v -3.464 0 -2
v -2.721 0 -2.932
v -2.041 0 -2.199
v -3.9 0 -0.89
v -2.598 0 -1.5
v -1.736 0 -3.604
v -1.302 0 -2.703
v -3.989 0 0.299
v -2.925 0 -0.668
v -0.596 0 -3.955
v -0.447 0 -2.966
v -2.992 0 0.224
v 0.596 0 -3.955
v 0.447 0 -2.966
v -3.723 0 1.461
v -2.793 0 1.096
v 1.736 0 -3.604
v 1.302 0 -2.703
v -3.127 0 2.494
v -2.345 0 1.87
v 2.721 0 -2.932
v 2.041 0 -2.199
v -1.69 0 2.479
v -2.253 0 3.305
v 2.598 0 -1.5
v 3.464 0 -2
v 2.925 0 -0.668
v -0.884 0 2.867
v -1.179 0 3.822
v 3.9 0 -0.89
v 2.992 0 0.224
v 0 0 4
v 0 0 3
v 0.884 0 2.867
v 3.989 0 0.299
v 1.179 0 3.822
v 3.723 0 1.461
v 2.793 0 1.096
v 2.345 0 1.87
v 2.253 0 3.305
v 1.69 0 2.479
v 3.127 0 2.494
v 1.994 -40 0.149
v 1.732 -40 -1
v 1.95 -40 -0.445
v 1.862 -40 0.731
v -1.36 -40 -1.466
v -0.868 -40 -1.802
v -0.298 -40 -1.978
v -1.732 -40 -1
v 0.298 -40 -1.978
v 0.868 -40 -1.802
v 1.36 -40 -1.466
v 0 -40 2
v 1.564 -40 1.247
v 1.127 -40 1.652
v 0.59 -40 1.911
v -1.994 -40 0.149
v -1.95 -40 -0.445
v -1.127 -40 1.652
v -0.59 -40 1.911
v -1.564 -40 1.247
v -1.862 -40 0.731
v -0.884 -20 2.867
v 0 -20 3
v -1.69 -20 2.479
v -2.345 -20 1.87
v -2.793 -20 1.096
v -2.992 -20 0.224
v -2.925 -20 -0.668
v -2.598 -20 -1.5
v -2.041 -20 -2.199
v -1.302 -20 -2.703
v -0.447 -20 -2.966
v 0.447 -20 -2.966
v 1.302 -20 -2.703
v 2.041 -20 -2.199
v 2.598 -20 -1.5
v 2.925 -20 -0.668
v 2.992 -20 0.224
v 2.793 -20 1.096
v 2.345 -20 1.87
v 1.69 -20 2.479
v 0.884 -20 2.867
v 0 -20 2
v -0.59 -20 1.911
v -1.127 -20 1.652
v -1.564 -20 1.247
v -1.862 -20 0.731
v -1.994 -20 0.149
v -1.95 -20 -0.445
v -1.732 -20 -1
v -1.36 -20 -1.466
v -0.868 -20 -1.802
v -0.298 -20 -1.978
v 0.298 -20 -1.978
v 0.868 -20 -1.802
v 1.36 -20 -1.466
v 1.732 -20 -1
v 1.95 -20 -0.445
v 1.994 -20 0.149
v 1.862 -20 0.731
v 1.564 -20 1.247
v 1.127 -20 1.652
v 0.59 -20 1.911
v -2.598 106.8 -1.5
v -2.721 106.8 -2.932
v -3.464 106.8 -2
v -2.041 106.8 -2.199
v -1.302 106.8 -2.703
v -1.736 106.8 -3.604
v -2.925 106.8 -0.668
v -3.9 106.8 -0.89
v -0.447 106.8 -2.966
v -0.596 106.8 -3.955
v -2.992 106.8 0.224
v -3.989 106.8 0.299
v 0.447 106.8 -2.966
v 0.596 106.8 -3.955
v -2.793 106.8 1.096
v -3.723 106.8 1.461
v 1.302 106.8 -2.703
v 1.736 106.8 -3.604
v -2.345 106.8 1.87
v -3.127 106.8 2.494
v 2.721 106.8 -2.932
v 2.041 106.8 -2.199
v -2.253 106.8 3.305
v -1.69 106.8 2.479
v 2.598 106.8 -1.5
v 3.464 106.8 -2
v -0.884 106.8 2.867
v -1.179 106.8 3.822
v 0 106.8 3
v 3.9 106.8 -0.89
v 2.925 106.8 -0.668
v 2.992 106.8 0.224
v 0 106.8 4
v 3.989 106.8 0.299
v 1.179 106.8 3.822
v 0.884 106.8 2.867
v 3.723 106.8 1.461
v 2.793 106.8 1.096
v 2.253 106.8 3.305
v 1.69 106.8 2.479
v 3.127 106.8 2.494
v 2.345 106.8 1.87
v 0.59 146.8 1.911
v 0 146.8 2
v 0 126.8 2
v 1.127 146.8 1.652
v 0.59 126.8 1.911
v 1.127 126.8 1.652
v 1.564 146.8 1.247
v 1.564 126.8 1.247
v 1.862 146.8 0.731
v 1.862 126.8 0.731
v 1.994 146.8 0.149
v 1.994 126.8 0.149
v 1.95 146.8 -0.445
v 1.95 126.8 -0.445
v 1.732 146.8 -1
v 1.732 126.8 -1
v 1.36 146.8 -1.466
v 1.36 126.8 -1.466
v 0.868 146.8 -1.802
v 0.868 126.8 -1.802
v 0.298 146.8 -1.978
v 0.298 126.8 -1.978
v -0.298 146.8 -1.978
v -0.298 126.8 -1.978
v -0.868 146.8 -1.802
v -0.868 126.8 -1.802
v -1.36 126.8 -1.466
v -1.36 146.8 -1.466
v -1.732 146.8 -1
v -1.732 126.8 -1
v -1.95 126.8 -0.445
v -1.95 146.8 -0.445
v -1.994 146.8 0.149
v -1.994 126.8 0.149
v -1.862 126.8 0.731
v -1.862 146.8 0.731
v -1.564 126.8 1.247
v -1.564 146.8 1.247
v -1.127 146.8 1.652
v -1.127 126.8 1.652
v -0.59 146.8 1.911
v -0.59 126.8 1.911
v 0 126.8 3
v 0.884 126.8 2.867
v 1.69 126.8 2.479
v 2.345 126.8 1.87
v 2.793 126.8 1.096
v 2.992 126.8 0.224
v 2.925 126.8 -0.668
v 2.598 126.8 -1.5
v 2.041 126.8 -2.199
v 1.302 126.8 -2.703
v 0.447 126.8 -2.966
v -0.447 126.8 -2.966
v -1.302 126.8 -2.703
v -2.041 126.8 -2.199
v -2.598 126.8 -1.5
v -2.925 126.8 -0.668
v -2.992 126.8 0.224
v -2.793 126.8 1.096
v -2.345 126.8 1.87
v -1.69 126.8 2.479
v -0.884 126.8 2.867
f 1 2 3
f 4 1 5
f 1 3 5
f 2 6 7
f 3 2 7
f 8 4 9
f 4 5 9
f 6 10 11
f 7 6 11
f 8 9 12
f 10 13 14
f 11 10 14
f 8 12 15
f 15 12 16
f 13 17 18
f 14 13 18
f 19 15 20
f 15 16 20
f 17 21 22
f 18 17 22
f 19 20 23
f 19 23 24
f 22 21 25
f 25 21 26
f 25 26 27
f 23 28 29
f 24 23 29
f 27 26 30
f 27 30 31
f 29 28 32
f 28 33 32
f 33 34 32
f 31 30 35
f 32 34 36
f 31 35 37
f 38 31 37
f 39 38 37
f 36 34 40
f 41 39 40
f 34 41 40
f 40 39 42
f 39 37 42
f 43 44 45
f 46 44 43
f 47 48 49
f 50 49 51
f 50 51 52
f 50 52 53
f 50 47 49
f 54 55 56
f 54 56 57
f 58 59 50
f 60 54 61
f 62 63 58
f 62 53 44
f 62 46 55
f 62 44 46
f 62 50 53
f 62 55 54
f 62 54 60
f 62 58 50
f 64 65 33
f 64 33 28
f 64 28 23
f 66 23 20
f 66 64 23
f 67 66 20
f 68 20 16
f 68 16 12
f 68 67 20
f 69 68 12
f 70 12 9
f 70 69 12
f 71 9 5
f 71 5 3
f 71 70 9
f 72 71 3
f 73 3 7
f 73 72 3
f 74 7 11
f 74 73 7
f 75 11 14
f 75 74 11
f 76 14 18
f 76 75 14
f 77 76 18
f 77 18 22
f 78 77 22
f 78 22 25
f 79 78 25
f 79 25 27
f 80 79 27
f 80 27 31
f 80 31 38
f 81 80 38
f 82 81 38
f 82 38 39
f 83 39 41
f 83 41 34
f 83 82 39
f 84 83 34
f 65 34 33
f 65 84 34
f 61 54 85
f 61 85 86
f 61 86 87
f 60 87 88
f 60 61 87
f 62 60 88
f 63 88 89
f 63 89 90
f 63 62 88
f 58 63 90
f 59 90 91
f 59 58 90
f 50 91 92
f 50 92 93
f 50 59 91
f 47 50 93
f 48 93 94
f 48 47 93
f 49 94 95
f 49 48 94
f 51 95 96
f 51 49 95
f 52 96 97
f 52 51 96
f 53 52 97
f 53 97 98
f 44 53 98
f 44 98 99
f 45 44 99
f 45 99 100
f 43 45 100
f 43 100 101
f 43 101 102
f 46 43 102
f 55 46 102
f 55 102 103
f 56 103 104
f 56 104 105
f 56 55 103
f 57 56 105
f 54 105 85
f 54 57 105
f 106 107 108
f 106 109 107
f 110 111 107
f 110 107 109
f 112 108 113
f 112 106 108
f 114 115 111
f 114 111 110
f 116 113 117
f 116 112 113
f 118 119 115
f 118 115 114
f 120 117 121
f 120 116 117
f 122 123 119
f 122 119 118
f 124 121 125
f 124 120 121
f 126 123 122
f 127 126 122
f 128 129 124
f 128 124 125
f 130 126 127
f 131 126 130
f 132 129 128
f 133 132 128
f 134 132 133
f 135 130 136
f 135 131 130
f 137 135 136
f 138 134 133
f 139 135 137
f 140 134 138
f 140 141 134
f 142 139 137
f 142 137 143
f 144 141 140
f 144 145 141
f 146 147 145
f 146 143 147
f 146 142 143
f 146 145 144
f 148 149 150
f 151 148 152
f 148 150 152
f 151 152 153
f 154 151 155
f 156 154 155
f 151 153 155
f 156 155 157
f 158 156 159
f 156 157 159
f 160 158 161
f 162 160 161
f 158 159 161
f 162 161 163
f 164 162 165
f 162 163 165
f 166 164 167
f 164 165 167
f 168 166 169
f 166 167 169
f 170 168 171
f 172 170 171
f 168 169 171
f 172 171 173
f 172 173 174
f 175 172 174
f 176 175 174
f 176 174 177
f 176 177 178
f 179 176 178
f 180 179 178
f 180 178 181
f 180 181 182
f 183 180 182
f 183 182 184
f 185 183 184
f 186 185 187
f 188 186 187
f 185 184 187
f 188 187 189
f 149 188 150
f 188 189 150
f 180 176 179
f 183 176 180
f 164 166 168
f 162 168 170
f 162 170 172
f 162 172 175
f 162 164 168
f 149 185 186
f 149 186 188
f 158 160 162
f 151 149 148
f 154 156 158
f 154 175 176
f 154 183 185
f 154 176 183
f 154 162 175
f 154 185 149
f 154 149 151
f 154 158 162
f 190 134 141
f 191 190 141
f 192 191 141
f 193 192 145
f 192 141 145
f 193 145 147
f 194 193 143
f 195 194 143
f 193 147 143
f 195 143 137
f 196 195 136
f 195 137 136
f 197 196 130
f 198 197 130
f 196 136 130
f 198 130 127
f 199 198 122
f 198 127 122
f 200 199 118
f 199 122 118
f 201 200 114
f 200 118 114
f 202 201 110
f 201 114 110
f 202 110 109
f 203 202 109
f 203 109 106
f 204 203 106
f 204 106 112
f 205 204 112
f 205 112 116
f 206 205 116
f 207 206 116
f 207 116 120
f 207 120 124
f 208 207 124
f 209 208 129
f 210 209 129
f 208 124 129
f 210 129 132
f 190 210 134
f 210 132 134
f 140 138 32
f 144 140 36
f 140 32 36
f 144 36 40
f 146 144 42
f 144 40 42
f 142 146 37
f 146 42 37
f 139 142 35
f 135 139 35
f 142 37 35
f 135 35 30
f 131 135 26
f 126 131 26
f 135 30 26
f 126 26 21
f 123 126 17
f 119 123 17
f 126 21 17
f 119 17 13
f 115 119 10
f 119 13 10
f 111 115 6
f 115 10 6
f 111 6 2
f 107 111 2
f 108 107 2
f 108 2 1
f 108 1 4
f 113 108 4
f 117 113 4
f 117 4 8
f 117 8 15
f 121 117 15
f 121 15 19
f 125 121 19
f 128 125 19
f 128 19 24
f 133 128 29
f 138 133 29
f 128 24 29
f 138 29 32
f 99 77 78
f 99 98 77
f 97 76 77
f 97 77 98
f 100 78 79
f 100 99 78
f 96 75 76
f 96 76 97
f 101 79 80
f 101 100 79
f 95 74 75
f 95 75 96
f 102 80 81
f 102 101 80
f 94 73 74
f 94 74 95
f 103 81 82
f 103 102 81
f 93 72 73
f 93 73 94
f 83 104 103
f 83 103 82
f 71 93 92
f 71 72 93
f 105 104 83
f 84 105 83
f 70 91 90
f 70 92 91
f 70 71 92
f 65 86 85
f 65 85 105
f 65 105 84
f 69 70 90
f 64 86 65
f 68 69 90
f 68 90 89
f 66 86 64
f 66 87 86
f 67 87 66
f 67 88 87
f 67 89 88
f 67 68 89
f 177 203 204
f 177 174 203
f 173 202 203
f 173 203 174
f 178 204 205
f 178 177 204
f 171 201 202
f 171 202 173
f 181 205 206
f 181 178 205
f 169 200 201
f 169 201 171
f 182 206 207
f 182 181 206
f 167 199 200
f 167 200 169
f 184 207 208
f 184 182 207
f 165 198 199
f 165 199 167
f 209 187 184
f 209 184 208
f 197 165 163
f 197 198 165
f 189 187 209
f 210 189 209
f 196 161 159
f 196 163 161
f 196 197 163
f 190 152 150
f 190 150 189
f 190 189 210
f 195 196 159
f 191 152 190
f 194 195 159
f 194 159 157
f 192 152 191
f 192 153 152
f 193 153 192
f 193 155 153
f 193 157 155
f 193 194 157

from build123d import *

# Parameters (mm, degrees)
SKETCH_1_R      = 4
EXTRUDE_1_DEPTH = 106.8
SKETCH_2_R      = 3
EXTRUDE_2_DEPTH = 20
SKETCH_3_R      = 2
EXTRUDE_3_DEPTH = 20
EXTRUDE_START   = 20
SKETCH_4_R      = 3
EXTRUDE_4_DEPTH = 20
SKETCH_5_R      = 2
EXTRUDE_5_DEPTH = 20


with BuildPart() as part:
    # 草图1 → 凸台-拉伸1 (new body)
    with BuildSketch(Plane(origin=(0, 0, 0), x_dir=(1, 0, 0), z_dir=(0, 1, 0))):
        with Locations(Location((0, 0, 0), (0, 0, 270))):
            Circle(SKETCH_1_R)
    extrude(amount=EXTRUDE_1_DEPTH)

    # 草图2 → 凸台-拉伸2 (add)
    with BuildSketch(Plane(origin=(0, 106.8, 0), x_dir=(1, 0, 0), z_dir=(0, 1, 0))):
        with Locations(Location((0, 0, 0), (0, 0, 270))):
            Circle(SKETCH_2_R)
    extrude(amount=EXTRUDE_2_DEPTH)

    # 草图3 → 凸台-拉伸3 (add)
    with BuildSketch(Plane(origin=(0, 126.8, 0), x_dir=(1, 0, 0), z_dir=(0, 1, 0))):
        with Locations(Location((0, 0, 0), (0, 0, 270))):
            Circle(SKETCH_3_R)
    extrude(amount=EXTRUDE_3_DEPTH)

    # 草图4 → 凸台-拉伸4 (add)
    with BuildSketch(Plane.XZ.offset(EXTRUDE_START)):
        with Locations(Location((0, 0, 0), (0, 0, 90))):
            Circle(SKETCH_4_R)
    extrude(amount=-EXTRUDE_4_DEPTH)

    # 草图5 → 凸台-拉伸5 (add)
    with BuildSketch(Plane.XZ.offset(20).offset(EXTRUDE_START)):
        with Locations(Location((0, 0, 0), (0, 0, 90))):
            Circle(SKETCH_5_R)
    extrude(amount=-EXTRUDE_5_DEPTH)


solid = part.part
